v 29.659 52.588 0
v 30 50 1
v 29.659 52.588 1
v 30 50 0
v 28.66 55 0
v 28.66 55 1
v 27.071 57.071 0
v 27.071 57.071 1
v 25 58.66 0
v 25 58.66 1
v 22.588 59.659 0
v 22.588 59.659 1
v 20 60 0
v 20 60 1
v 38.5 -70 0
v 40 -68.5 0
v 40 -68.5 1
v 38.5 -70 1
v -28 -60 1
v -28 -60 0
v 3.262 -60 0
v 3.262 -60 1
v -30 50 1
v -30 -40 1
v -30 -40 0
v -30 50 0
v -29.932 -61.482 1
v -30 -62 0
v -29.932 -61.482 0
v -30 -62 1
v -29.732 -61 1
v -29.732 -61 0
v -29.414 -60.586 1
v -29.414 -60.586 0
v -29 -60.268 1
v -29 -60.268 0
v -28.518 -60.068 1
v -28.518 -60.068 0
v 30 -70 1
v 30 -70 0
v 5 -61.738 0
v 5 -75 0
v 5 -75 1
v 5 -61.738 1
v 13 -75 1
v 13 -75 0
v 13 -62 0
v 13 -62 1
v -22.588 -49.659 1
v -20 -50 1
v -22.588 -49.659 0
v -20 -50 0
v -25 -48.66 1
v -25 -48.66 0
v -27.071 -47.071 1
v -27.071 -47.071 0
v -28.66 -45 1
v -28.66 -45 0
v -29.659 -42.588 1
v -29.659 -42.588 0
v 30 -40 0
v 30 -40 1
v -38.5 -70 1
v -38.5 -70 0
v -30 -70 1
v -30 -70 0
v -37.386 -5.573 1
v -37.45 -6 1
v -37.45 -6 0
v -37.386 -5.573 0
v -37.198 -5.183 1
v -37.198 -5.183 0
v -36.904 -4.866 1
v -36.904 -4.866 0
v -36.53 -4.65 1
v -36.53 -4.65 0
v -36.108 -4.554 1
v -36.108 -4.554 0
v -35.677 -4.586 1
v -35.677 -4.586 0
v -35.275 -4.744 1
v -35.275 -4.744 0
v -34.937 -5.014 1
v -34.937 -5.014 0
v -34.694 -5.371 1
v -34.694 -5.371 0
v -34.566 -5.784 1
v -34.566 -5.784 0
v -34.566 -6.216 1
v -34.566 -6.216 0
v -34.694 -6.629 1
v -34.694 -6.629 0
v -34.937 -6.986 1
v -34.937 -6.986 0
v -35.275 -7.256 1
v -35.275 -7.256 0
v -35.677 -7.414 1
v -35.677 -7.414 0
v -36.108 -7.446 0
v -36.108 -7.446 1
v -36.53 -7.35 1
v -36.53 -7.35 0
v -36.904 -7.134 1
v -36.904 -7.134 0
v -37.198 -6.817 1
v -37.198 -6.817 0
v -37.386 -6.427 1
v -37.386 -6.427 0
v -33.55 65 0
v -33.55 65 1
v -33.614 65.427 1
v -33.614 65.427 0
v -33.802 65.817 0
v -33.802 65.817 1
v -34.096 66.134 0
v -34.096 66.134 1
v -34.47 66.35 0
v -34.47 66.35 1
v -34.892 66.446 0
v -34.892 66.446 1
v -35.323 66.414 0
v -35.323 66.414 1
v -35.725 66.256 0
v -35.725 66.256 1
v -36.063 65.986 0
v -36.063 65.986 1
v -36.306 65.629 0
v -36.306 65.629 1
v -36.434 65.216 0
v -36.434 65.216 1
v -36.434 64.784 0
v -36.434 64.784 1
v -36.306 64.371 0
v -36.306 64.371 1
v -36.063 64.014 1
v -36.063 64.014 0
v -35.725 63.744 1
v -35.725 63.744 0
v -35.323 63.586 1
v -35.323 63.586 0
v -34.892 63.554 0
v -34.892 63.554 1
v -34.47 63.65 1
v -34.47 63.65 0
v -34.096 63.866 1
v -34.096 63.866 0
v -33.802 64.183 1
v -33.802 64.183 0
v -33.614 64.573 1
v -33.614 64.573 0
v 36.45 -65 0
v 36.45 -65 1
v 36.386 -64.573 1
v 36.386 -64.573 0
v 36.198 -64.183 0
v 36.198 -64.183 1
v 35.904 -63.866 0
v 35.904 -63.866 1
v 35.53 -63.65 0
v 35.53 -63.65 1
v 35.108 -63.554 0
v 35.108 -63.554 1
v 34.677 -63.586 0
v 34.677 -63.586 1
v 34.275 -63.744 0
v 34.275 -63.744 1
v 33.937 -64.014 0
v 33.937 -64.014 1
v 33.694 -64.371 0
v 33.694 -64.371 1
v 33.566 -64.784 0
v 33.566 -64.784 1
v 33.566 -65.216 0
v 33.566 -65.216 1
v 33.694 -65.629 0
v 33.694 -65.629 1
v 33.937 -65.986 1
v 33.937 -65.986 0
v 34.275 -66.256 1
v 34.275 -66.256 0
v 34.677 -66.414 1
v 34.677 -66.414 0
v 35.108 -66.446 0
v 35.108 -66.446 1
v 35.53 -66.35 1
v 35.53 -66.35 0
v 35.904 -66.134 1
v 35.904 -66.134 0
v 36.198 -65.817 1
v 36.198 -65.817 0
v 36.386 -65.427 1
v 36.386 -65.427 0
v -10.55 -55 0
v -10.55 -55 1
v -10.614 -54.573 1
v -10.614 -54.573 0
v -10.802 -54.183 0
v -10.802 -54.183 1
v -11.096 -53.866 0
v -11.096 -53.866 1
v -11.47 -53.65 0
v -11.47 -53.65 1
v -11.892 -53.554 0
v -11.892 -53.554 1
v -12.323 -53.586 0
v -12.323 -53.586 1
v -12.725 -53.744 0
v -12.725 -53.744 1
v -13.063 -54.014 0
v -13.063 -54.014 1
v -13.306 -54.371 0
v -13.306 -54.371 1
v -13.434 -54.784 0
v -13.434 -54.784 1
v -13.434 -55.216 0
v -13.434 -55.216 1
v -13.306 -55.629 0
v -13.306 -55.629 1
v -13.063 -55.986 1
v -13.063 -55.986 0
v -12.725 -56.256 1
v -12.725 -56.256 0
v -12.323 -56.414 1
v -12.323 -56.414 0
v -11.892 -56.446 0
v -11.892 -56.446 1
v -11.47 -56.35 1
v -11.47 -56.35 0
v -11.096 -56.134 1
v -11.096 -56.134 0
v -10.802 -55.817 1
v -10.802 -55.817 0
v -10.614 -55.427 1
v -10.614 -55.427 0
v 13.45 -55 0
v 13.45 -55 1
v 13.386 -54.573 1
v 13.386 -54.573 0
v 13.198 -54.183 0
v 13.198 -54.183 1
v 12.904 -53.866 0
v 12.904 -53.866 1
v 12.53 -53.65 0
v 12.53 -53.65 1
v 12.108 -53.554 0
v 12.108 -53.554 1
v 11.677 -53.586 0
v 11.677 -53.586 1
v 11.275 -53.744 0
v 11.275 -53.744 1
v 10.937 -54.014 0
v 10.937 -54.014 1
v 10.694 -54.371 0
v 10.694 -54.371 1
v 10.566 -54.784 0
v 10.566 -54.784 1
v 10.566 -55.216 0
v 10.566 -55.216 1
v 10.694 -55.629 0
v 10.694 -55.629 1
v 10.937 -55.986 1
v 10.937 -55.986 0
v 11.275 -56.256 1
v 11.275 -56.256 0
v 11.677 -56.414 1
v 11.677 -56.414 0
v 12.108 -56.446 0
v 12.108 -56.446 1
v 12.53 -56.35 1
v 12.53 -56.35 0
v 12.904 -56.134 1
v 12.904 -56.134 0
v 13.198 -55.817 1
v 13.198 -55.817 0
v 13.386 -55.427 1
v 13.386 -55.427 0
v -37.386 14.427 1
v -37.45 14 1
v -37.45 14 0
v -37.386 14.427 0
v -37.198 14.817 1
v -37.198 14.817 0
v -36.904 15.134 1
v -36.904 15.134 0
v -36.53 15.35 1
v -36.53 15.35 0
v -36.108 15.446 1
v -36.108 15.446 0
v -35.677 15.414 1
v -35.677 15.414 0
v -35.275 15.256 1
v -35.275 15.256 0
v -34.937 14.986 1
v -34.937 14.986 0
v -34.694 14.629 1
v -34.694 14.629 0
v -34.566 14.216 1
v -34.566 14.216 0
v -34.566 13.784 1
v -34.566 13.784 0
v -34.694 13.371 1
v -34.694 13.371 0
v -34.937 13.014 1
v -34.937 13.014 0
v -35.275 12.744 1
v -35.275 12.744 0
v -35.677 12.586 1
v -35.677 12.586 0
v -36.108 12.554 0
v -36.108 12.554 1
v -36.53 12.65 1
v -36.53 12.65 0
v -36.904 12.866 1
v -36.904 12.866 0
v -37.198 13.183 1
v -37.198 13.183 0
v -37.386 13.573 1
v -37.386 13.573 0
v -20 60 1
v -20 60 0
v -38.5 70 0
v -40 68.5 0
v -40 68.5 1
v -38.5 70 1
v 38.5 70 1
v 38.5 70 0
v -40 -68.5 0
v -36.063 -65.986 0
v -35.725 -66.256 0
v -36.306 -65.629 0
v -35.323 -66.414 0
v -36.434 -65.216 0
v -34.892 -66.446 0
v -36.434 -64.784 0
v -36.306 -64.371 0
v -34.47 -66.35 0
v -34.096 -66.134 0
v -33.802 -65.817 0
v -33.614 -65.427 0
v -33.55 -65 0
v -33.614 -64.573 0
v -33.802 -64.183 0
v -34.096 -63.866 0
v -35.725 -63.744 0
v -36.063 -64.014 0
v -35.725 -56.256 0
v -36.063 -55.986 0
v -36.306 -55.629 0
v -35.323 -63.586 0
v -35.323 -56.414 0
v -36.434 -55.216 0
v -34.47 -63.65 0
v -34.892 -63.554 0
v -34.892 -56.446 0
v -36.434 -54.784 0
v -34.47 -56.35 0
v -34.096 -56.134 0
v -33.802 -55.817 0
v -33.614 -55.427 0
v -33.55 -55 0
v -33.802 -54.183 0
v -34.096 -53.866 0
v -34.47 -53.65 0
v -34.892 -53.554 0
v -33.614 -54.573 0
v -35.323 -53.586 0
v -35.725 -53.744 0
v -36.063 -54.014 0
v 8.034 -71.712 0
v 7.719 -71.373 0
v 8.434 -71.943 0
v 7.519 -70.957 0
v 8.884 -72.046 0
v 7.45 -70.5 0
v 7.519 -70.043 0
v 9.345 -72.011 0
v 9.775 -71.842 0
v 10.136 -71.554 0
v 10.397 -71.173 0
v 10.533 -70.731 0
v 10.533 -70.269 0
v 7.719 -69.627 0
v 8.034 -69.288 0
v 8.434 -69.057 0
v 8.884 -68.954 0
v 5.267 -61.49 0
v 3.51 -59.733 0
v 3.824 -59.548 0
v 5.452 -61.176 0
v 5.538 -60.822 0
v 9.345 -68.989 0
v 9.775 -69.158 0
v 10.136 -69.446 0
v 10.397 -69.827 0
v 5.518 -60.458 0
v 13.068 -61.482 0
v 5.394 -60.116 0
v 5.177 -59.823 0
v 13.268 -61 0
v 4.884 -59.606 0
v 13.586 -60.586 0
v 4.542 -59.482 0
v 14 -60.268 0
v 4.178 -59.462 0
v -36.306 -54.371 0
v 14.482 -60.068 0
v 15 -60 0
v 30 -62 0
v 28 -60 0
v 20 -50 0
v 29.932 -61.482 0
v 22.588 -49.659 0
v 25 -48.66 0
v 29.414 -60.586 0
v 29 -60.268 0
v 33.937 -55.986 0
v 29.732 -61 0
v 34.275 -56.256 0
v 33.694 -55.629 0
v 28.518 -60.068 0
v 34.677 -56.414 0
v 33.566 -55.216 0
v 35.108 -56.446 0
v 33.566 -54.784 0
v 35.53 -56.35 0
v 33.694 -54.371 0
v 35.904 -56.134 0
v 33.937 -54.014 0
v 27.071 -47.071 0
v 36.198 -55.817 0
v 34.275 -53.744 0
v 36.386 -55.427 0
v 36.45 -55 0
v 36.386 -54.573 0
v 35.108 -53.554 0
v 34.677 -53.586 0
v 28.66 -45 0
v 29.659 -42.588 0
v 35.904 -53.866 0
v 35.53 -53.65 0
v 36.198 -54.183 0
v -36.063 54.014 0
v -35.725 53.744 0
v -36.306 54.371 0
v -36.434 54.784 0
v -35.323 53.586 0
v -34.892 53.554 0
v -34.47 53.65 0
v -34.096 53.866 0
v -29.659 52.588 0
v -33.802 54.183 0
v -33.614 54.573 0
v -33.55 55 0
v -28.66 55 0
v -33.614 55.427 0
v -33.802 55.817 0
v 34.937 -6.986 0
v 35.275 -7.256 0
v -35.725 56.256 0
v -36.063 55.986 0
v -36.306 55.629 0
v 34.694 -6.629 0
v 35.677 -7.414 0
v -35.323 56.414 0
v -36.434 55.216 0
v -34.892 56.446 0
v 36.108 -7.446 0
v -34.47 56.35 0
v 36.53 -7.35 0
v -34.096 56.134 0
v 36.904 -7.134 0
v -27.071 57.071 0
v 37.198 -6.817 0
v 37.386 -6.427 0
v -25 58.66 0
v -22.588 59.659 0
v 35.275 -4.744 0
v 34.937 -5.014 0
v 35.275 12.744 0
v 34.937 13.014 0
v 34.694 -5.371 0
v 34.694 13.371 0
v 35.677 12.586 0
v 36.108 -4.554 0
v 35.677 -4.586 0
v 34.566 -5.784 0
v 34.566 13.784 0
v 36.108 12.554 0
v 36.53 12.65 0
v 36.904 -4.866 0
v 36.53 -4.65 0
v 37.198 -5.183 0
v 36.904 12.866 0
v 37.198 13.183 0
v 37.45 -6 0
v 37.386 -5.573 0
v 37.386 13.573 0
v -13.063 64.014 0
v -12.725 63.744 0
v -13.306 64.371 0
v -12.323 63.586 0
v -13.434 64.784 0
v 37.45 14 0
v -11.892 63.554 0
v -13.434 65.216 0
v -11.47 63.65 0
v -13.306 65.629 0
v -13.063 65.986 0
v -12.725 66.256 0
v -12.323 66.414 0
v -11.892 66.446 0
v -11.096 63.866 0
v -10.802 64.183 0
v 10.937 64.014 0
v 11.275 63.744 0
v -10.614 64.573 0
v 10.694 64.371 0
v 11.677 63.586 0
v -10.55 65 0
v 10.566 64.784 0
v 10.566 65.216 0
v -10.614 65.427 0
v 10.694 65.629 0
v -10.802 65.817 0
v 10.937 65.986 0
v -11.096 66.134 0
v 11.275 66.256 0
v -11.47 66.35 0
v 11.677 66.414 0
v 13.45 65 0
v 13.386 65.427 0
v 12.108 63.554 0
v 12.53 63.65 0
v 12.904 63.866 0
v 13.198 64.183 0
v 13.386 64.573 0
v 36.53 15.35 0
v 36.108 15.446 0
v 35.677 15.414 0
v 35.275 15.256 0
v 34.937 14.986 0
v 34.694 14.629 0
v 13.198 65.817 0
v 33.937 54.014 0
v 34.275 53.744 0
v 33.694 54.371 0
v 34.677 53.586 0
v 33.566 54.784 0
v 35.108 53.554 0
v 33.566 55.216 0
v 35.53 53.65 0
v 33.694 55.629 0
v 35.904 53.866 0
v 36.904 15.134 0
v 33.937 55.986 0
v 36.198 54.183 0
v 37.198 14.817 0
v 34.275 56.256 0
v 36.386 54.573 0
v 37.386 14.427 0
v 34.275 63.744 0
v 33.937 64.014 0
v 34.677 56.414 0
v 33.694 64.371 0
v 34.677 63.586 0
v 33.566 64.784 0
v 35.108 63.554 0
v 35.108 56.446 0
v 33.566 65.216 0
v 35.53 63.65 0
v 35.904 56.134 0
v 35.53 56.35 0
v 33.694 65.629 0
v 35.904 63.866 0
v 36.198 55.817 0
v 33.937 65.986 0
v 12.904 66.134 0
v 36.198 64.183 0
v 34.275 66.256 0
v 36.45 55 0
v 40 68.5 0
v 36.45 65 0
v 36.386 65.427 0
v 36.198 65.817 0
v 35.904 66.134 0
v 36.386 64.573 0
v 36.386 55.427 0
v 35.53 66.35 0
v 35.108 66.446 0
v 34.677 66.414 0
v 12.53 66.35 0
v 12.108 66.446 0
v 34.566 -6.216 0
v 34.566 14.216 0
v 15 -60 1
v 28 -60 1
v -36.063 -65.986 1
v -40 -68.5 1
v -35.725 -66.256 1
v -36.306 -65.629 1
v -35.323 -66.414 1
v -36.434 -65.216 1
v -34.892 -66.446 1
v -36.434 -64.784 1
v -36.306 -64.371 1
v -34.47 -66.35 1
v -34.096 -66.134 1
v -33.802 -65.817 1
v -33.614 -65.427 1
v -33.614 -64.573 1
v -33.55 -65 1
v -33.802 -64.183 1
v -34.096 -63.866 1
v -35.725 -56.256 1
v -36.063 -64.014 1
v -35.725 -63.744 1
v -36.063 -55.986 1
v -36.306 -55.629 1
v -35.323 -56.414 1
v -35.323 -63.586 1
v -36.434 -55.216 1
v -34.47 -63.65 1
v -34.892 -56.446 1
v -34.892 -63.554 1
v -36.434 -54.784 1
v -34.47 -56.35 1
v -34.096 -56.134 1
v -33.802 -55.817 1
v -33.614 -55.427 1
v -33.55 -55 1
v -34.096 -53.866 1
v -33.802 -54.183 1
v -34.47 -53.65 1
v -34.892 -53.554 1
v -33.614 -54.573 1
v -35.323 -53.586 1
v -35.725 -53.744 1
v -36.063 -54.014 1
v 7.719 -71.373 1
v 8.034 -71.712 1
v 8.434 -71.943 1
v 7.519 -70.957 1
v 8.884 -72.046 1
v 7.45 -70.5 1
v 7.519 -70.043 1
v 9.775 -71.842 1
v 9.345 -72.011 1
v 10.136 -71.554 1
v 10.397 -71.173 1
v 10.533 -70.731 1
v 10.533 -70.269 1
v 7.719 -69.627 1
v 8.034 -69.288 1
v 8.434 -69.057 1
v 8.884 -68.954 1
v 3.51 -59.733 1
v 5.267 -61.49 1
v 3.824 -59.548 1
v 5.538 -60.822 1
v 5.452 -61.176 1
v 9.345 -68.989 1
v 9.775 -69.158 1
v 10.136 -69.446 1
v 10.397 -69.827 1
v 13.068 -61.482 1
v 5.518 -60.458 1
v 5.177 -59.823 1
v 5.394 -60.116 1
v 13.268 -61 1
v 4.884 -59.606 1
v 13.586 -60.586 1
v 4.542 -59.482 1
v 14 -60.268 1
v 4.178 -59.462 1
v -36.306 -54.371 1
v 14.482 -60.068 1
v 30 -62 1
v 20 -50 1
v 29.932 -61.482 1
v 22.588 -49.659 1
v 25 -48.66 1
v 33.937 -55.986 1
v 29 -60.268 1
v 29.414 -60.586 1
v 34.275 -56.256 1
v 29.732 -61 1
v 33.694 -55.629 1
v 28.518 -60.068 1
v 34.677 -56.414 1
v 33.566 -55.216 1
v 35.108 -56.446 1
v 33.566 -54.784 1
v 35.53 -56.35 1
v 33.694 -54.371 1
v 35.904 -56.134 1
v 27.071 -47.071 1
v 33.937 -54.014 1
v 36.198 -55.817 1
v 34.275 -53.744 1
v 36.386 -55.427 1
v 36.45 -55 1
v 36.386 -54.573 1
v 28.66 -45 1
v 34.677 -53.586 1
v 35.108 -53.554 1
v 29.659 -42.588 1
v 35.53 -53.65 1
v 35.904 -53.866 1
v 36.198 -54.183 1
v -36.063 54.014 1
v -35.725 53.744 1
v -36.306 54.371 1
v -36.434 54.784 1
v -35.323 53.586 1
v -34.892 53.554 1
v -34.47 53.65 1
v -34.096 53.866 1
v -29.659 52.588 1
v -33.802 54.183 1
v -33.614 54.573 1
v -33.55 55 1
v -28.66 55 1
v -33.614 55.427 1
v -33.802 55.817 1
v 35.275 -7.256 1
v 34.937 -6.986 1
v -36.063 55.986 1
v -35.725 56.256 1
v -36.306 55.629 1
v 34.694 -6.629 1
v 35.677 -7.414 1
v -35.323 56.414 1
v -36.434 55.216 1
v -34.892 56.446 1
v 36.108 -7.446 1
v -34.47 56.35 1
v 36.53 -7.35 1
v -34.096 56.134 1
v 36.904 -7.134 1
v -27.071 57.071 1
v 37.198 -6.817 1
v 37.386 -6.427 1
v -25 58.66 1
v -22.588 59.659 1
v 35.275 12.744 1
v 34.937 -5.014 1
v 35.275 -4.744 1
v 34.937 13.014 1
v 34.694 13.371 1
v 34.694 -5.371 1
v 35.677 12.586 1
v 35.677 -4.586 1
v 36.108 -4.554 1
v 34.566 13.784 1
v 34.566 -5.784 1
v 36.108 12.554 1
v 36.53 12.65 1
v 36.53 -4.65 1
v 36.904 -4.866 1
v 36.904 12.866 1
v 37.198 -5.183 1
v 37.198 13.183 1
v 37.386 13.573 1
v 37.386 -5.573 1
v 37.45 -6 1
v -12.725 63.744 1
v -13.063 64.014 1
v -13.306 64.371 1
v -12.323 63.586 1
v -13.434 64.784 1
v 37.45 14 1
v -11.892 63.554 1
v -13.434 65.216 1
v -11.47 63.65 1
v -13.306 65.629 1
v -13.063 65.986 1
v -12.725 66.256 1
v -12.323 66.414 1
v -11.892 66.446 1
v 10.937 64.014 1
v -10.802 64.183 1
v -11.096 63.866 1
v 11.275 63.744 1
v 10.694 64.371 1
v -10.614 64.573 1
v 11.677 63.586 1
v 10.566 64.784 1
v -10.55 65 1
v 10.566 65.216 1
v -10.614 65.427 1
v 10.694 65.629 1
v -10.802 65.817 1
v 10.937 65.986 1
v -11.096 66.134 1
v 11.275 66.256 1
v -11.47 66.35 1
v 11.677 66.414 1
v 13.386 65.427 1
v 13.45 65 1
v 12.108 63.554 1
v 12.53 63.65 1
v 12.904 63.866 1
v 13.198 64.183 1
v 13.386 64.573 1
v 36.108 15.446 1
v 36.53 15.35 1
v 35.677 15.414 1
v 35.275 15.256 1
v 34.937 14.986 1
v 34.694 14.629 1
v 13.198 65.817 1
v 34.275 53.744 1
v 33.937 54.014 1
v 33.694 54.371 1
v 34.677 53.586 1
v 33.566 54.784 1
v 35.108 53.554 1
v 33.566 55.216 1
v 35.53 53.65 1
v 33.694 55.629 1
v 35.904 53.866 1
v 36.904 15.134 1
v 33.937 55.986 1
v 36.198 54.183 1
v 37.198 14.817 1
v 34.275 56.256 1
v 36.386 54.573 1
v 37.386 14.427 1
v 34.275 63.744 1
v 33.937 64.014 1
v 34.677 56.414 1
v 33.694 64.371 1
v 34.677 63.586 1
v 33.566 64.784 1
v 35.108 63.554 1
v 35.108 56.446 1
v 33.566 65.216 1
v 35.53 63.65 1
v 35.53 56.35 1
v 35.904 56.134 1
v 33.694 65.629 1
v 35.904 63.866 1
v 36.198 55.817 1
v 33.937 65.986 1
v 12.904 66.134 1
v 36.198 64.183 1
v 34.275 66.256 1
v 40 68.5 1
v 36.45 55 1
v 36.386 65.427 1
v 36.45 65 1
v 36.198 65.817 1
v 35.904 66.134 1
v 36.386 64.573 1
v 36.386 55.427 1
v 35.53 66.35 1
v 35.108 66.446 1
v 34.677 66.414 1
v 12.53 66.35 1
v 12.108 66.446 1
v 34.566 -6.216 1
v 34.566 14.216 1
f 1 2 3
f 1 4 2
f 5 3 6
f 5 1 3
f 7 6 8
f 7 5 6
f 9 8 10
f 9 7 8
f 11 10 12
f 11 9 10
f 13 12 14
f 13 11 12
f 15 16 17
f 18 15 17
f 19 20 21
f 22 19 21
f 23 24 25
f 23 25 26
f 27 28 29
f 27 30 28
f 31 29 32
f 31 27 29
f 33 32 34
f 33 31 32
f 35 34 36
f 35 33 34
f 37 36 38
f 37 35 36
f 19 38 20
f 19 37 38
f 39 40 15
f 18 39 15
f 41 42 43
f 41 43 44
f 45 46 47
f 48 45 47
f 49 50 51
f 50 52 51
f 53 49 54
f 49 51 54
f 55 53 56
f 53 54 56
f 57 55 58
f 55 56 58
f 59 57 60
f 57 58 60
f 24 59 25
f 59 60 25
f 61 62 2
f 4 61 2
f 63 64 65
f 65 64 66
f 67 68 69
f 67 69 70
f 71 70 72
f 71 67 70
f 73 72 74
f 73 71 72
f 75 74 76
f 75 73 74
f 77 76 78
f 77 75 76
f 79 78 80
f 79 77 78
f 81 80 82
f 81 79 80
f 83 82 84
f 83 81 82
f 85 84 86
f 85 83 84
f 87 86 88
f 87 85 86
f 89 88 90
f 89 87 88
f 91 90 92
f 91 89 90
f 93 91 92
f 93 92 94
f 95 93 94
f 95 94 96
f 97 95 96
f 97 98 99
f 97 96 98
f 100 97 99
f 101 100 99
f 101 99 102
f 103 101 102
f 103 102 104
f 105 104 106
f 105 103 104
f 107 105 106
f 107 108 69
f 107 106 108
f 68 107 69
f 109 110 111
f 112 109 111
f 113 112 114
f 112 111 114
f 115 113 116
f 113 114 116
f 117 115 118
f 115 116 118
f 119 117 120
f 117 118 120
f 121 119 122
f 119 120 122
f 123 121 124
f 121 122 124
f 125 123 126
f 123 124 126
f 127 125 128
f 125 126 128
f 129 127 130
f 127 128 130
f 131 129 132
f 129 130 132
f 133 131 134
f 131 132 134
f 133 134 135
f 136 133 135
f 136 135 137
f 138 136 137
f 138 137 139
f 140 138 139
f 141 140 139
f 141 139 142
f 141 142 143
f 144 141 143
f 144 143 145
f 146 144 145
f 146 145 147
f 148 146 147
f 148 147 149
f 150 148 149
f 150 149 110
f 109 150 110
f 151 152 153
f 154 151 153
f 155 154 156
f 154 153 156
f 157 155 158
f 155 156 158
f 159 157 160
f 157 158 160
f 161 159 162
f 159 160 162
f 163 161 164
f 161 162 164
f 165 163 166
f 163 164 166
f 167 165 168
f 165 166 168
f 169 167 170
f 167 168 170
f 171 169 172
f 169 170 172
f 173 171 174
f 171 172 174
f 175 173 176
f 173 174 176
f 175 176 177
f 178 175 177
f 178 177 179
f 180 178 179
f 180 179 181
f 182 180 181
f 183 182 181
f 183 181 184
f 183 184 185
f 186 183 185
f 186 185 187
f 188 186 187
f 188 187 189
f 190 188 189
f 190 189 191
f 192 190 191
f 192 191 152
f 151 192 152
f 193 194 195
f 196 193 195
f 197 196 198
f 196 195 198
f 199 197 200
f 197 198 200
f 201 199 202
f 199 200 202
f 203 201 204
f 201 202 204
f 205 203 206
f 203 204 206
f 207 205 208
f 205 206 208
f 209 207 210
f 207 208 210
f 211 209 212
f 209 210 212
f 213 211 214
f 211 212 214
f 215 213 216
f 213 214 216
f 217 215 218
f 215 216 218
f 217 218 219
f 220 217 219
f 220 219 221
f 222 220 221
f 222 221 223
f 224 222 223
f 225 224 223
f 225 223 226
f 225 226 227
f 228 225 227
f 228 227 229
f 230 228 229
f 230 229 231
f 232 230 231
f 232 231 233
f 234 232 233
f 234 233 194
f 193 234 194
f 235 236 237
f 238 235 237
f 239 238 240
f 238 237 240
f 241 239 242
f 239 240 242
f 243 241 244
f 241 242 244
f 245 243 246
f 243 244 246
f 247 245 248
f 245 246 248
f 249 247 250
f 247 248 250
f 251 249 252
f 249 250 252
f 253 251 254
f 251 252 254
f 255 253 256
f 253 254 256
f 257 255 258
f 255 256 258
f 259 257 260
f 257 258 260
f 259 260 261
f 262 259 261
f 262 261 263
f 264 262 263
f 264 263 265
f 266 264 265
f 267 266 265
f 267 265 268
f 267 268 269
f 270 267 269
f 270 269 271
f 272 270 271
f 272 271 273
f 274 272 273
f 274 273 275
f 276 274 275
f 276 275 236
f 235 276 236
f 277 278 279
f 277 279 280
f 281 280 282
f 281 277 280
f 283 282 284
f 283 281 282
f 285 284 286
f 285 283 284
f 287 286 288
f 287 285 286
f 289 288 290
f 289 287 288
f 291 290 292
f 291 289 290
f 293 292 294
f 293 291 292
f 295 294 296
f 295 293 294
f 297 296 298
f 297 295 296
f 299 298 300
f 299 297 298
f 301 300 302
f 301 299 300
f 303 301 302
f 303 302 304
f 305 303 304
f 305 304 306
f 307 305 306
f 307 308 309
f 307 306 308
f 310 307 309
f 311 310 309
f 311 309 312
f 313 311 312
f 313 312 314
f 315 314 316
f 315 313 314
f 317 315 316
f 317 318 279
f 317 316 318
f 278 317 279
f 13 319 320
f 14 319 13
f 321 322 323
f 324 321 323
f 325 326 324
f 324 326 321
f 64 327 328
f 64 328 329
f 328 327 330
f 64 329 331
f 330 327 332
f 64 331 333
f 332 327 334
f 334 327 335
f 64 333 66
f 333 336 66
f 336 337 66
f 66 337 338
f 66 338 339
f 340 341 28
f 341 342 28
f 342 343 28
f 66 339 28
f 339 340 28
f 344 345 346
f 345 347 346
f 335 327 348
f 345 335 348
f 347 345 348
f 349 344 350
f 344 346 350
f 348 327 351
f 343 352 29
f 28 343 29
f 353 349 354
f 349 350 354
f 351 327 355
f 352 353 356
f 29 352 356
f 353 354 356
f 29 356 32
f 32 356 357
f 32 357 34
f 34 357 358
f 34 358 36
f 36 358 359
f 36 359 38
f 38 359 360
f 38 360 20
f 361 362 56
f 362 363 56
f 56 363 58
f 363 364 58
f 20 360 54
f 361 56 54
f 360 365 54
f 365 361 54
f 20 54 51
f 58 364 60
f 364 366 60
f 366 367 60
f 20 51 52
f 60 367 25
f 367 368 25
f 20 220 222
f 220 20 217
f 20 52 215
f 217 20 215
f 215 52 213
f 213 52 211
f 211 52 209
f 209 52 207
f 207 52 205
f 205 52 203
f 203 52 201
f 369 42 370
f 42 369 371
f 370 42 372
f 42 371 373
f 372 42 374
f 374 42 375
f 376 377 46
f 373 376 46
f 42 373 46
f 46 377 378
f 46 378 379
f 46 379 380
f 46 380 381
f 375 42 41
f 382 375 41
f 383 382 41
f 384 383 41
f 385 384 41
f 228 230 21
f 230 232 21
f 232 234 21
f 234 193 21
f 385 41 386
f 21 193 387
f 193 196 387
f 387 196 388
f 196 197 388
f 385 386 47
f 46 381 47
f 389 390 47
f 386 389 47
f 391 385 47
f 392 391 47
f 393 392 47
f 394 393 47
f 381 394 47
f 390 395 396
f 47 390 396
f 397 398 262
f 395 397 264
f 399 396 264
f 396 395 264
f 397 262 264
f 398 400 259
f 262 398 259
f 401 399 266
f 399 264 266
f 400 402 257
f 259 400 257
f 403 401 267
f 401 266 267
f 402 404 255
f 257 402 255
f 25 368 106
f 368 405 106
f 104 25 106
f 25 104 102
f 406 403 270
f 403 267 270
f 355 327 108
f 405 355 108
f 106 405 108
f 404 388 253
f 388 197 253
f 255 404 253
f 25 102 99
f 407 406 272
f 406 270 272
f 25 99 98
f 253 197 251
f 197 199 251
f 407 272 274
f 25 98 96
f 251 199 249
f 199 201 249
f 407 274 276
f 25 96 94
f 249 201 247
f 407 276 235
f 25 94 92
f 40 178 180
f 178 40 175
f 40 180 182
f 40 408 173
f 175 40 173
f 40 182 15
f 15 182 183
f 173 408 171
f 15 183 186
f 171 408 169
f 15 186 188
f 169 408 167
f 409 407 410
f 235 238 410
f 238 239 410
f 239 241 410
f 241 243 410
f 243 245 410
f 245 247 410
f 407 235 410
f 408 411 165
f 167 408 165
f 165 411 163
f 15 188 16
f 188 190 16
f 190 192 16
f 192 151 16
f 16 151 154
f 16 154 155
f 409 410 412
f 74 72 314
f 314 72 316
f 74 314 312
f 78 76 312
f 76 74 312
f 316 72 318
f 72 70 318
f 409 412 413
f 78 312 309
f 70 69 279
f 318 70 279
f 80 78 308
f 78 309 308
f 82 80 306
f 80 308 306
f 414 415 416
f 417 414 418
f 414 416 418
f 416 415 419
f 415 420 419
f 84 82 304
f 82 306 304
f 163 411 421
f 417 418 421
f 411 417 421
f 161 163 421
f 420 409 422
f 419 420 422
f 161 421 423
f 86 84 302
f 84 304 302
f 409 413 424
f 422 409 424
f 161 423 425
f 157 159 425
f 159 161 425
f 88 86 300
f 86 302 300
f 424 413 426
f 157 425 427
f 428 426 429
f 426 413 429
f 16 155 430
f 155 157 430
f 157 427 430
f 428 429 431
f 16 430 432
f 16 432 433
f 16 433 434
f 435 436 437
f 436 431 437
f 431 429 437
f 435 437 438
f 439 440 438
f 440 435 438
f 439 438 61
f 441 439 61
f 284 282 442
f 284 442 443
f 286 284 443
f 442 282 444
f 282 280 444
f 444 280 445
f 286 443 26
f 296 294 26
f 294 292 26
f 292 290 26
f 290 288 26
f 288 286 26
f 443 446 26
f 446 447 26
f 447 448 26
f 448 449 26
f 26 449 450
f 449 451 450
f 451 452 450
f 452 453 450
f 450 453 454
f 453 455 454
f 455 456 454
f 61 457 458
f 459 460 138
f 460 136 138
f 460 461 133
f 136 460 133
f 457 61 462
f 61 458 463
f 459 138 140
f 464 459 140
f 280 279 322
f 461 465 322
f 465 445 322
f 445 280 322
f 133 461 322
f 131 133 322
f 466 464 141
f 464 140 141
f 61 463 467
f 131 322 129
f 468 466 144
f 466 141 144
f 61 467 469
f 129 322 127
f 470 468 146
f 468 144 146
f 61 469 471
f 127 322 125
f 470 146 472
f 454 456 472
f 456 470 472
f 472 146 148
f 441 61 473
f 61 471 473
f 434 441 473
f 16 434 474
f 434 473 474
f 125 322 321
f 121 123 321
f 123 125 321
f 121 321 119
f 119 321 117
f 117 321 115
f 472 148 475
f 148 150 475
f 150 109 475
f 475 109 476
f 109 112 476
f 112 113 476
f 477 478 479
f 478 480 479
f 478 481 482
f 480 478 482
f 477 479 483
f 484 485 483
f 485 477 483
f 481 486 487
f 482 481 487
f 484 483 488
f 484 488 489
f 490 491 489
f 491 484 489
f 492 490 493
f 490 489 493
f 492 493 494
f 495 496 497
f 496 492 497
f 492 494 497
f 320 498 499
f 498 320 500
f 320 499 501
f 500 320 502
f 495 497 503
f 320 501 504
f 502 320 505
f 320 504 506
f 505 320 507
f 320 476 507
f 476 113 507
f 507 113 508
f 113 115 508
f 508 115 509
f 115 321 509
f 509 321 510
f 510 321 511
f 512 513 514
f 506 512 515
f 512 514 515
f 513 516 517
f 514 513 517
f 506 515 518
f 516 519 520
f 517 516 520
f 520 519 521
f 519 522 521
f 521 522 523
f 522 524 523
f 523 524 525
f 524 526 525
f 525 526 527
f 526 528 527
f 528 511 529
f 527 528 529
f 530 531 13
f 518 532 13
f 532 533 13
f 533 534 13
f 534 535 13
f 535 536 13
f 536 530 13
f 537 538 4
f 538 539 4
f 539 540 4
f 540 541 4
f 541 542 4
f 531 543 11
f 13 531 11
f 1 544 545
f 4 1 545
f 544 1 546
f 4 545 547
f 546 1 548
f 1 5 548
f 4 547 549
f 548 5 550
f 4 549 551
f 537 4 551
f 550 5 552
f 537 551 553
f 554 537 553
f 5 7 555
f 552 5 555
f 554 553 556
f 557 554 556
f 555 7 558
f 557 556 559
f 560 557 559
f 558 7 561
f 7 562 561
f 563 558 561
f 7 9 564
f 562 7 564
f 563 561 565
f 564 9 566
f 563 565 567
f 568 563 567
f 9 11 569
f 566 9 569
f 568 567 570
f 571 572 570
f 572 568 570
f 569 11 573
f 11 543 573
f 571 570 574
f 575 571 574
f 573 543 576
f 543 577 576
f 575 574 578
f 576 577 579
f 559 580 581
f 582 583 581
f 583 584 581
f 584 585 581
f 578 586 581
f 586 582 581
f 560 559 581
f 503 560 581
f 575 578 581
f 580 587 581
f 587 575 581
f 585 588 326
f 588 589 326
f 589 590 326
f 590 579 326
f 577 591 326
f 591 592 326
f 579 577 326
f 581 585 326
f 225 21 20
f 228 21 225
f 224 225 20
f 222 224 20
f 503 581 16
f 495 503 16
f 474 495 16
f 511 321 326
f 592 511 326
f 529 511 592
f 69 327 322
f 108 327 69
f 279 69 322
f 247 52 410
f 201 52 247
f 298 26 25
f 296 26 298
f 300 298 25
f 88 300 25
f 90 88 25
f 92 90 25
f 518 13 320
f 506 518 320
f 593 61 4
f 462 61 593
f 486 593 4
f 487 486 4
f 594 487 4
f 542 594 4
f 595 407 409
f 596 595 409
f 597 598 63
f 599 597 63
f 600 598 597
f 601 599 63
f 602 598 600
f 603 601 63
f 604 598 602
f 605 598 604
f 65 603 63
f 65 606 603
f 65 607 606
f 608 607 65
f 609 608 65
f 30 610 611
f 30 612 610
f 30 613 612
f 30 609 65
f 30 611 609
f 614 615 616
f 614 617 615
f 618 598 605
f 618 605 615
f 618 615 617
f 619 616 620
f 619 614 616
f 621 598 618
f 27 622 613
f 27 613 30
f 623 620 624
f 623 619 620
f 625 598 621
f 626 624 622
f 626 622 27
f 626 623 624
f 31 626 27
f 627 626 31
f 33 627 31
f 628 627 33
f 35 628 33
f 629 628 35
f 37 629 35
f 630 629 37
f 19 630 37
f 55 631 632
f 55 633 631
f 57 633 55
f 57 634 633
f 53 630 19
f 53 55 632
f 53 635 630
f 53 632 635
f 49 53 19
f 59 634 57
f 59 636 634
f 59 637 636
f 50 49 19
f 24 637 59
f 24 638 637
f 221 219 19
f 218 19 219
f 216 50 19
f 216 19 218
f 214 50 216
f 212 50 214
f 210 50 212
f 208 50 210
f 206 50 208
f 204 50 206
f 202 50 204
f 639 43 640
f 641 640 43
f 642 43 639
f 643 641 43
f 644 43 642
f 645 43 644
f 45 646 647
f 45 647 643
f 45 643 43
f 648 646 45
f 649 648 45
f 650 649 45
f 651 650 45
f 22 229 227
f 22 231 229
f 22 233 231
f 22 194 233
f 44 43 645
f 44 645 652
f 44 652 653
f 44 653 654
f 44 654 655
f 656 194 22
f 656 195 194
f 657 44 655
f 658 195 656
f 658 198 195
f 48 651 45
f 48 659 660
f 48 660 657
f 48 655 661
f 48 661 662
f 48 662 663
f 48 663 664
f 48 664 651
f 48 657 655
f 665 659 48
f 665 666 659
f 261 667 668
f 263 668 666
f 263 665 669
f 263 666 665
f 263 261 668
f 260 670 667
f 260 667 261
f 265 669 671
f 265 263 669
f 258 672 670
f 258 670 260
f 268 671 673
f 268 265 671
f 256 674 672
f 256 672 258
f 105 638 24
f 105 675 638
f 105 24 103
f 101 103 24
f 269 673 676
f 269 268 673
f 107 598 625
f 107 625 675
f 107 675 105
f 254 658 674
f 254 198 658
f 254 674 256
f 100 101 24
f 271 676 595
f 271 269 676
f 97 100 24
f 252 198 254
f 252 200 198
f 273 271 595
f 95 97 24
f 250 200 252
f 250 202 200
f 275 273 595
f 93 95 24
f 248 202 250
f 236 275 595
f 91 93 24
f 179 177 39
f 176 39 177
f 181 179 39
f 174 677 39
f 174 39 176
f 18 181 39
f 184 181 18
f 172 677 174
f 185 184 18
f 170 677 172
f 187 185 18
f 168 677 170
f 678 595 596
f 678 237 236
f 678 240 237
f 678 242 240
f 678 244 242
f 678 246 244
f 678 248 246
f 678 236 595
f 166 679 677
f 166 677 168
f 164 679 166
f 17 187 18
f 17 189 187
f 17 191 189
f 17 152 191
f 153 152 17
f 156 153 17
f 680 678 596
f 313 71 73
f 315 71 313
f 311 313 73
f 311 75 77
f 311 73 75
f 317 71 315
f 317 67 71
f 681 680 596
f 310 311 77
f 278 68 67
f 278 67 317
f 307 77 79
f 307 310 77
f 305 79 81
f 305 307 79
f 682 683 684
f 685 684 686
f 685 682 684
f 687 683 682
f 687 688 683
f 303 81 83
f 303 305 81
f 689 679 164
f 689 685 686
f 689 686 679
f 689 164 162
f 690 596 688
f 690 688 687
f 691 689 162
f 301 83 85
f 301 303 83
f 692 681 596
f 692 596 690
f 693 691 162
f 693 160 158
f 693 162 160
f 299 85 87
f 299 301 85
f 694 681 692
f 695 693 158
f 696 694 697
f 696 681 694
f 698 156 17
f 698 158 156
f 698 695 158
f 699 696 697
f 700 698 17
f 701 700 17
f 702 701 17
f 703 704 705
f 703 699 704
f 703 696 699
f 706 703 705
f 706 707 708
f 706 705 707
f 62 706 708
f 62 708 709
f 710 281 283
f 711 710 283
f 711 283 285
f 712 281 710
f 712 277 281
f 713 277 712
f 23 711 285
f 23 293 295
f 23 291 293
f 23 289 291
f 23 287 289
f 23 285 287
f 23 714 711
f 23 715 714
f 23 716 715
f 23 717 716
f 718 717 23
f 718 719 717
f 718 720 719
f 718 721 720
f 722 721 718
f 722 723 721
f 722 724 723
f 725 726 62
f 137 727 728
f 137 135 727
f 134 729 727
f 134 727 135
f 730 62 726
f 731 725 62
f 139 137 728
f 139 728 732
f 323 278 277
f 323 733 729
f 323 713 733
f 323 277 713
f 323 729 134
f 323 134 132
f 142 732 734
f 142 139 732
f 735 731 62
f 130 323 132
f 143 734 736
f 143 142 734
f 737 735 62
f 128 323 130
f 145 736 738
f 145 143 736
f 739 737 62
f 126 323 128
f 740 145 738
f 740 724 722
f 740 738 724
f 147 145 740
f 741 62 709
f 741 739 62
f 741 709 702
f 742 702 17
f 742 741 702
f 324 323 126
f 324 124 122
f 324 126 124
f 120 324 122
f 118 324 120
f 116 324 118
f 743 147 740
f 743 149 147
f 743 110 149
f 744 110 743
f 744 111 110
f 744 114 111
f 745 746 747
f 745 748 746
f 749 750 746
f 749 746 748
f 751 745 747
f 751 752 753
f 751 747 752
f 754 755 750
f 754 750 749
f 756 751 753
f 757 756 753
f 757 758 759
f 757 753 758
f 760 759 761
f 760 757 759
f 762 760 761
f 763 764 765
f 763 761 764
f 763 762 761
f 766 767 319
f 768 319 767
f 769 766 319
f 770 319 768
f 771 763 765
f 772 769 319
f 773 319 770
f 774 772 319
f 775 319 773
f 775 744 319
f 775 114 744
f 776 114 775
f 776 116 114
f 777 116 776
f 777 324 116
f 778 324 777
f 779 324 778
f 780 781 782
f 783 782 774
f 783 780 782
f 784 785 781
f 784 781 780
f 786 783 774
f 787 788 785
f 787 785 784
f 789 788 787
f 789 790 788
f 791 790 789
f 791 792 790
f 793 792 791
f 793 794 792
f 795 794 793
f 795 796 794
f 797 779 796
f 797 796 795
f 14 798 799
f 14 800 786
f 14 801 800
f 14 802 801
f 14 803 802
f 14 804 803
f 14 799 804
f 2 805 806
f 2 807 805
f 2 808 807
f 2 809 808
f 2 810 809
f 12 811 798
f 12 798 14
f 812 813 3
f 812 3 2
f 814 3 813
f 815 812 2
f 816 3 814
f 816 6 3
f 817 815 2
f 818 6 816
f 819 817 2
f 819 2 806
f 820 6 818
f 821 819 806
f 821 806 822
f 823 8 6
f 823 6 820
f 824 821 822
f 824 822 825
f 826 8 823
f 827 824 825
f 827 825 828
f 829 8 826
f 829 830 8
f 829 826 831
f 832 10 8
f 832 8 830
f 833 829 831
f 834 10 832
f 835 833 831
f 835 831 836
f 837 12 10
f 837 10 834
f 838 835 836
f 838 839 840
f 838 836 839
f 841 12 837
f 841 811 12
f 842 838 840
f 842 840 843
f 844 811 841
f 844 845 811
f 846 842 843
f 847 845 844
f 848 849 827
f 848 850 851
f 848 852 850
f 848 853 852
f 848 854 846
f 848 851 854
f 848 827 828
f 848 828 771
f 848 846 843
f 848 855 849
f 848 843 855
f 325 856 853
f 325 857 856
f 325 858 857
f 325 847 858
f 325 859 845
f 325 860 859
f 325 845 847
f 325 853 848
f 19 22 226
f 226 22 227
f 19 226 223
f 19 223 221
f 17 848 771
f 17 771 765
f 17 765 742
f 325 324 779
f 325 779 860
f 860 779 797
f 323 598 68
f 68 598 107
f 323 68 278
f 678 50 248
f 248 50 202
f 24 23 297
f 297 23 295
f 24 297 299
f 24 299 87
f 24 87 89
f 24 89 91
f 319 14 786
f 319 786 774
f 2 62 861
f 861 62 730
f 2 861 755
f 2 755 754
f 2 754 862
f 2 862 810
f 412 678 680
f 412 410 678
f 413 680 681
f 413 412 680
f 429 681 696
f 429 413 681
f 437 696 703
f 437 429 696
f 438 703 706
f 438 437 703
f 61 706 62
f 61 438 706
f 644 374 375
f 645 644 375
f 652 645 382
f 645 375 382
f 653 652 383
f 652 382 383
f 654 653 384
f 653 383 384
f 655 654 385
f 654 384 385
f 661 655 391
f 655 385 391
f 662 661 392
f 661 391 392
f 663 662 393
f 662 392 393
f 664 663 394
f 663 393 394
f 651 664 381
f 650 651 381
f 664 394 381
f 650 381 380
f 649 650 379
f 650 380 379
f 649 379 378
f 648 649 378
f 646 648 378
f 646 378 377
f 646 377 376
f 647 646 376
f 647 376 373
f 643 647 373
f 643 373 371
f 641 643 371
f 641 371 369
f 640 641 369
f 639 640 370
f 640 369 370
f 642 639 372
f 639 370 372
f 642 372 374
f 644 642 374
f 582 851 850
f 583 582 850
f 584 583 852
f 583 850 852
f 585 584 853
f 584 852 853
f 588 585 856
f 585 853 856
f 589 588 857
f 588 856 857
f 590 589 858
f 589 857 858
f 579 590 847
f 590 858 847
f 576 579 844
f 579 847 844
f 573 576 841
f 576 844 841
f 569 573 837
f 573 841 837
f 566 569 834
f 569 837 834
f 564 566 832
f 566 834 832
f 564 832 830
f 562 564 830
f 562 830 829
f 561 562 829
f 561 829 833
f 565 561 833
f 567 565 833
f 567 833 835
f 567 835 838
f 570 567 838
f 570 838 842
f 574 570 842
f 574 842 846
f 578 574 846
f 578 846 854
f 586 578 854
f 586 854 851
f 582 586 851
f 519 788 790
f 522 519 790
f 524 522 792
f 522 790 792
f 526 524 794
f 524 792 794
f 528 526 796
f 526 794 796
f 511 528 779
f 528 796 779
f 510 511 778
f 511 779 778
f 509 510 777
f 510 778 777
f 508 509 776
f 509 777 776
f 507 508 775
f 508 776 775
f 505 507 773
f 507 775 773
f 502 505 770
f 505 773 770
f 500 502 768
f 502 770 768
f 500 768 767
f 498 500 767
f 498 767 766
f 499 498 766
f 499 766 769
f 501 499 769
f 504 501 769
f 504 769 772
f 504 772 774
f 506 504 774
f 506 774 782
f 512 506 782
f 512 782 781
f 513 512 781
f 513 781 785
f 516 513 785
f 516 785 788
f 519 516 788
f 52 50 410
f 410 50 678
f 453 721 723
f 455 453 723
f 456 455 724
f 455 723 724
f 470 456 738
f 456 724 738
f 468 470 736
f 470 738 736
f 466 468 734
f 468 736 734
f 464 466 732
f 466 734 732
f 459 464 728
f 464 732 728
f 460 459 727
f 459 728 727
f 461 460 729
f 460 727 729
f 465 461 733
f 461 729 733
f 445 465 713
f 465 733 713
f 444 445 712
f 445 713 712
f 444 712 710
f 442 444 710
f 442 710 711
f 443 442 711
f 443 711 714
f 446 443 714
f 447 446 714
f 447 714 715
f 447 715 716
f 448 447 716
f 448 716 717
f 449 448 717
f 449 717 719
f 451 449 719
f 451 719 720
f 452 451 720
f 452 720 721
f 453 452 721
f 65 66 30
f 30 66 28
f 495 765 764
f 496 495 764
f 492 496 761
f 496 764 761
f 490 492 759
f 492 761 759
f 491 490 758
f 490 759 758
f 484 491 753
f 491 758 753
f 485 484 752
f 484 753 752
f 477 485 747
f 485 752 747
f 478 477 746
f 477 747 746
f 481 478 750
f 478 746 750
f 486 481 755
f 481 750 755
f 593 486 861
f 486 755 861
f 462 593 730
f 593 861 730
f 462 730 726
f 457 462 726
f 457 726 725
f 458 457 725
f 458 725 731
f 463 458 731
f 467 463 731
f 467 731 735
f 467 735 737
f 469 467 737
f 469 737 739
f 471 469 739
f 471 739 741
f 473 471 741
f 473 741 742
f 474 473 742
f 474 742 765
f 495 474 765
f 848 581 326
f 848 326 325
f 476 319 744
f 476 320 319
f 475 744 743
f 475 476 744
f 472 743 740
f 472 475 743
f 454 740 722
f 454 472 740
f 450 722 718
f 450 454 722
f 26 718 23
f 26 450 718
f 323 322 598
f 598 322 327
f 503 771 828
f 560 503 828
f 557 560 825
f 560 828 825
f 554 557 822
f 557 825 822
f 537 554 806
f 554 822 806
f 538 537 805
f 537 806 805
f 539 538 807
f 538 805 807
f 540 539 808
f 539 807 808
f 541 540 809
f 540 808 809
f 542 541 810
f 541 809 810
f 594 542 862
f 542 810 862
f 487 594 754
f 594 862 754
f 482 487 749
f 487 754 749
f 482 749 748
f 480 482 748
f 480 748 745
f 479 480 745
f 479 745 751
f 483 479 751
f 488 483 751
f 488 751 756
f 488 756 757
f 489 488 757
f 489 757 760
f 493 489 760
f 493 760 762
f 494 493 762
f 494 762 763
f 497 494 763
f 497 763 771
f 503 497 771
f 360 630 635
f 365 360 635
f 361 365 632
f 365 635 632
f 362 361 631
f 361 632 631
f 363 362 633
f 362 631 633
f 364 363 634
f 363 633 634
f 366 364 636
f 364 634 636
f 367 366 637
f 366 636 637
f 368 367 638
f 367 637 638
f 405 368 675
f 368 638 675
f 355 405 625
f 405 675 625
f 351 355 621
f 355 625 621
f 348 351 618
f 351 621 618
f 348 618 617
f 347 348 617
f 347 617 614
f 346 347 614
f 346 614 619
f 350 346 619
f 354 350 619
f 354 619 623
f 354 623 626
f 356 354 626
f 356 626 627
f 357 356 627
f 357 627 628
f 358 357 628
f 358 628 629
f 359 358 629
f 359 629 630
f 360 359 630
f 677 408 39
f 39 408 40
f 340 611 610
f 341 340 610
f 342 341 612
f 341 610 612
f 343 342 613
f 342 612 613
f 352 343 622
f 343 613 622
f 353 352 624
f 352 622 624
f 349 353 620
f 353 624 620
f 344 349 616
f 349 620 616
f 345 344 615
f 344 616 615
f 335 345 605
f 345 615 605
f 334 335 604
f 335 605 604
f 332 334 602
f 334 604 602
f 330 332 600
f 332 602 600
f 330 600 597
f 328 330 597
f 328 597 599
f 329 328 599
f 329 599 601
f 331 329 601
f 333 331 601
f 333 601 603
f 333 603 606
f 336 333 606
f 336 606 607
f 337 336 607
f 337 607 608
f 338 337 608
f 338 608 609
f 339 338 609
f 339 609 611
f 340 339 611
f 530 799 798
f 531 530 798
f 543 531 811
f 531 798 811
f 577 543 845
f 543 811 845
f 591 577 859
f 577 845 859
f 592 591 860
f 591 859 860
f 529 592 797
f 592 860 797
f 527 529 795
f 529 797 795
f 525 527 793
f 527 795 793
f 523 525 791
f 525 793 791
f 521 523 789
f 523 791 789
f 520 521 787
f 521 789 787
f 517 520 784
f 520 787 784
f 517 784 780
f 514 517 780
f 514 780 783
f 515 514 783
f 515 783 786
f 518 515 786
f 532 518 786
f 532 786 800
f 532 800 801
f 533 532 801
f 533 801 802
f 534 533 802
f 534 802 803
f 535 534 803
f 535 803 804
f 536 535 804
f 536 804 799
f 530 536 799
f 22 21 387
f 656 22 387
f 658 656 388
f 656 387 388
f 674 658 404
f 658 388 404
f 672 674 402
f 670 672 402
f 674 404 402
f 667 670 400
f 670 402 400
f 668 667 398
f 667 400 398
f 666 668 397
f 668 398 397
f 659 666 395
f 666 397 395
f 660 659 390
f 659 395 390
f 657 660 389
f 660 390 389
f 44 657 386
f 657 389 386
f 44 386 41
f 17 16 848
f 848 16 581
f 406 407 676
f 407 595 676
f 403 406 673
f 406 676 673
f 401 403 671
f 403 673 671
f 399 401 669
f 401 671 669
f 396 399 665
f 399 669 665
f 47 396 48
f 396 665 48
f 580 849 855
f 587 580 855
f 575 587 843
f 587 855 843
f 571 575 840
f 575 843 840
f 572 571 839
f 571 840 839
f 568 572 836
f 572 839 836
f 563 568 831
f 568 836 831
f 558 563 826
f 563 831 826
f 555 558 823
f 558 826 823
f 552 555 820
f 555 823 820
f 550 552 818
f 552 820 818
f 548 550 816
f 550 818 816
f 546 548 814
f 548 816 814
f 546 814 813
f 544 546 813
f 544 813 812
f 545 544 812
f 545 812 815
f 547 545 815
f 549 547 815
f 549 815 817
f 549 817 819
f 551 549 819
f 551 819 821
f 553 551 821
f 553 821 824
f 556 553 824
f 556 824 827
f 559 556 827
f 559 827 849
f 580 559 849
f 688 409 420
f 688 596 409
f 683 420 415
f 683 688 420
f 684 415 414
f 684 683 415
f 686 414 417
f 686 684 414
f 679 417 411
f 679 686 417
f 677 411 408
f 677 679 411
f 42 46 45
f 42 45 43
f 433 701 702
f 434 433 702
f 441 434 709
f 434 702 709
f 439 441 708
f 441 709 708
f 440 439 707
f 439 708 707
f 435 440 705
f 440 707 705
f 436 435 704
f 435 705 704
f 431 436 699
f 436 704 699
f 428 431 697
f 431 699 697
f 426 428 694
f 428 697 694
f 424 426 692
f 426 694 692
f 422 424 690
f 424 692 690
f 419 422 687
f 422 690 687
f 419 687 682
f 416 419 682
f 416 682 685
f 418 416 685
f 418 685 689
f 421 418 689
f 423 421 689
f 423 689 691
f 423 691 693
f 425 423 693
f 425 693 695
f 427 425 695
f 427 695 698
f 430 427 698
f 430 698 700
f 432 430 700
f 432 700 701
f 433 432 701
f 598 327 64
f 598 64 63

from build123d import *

# Parameters (mm, degrees)
BOSS_EXTRUDE12_DEPTH       = 1
SKETCH88_W                 = 60
SKETCH88_H                 = 110
CUT_EXTRUDE1_DEPTH         = 1
FILLET1_R                  = 10
M2_5_CLEARANCE_HOLE1_D     = 2.9
M2_5_CLEARANCE_HOLE1_DEPTH = 11.5
SKETCH91_W                 = 8
SKETCH91_H                 = 15
SKETCH91_R                 = 1.55
BOSS_EXTRUDE13_DEPTH       = 1
FILLET2_R                  = 2
CHAMFER1_SIZE              = 1.5
SKETCH93_R                 = 1.25
CUT_EXTRUDE2_DEPTH         = 10
M2_5_CLEARANCE_HOLE2_D     = 2.9
M2_5_CLEARANCE_HOLE2_DEPTH = 30


with BuildPart() as part:
    # Sketch87 → Boss-Extrude12 (new body)
    with BuildSketch(Plane.XY):
        Polygon((-40, 70), (-40, -70), (-30, -70), (-30, -60), (30, -60), (30, -70), (40, -70), (40, 70), align=None)
    extrude(amount=BOSS_EXTRUDE12_DEPTH)

    # Sketch88 → Cut-Extrude1 (cut)
    with BuildSketch(Plane.XY.offset(1)):
        with Locations((0, 5)):
            Rectangle(SKETCH88_W, SKETCH88_H)
    extrude(amount=-CUT_EXTRUDE1_DEPTH, mode=Mode.SUBTRACT)

    # Fillet1
    fillet1_edges = [part.edges().sort_by_distance(p)[0] for p in [
        (-30, -50, 0.5),
        (-30, 60, 0.5),
        (30, 60, 0.5),
        (30, -50, 0.5),
    ]]
    fillet(fillet1_edges, radius=FILLET1_R)

    # M2.5 Clearance Hole1
    with Locations(Plane(origin=(0, 0, 0), x_dir=(-1, 0, 0), z_dir=(0, 0, -1))):
        with Locations((35, -65), (35, -55), (-35, -55), (-35, -65), (12, -55), (-12, -55), (-12, 65), (12, 65), (-35, 65), (35, 65), (-35, 55), (35, 55)):
            Hole(M2_5_CLEARANCE_HOLE1_D / 2, depth=M2_5_CLEARANCE_HOLE1_DEPTH)

    # Sketch91 → Boss-Extrude13 (add)
    with BuildSketch(Plane(origin=(0, 0, 0), x_dir=(-1, 0, 0), z_dir=(0, 0, -1))):
        with Locations((-9, -67.5)):
            Rectangle(SKETCH91_W, SKETCH91_H)
        with Locations((-9, -70.5)):
            Circle(SKETCH91_R, mode=Mode.SUBTRACT)
    extrude(amount=-BOSS_EXTRUDE13_DEPTH)

    # Fillet2
    fillet2_edges = [part.edges().sort_by_distance(p)[0] for p in [
        (30, -60, 0.5),
        (-30, -60, 0.5),
        (13, -60, 0.5),
    ]]
    fillet(fillet2_edges, radius=FILLET2_R)

    # Chamfer1
    chamfer1_edges = [part.edges().sort_by_distance(p)[0] for p in [
        (40, 70, 0.5),
        (40, -70, 0.5),
        (-40, -70, 0.5),
        (-40, 70, 0.5),
    ]]
    chamfer(chamfer1_edges, length=CHAMFER1_SIZE)

    # Sketch93 → Cut-Extrude2 (cut)
    with BuildSketch(Plane(origin=(0, 0, 0), x_dir=(-1, 0, 0), z_dir=(0, 0, -1))):
        with Locations((-4.292893219, -60.707106781)):
            Circle(SKETCH93_R)
    extrude(amount=-CUT_EXTRUDE2_DEPTH, mode=Mode.SUBTRACT)

    # M2.5 Clearance Hole2
    with Locations(Plane(origin=(0, 0, 0), x_dir=(-1, 0, 0), z_dir=(0, 0, -1))):
        with Locations((-36, 14), (-36, -6)):
            m2_5_clearance_hole2 = Hole(M2_5_CLEARANCE_HOLE2_D / 2, depth=M2_5_CLEARANCE_HOLE2_DEPTH)

    # Mirror1: M2.5 Clearance Hole2 across plane
    add(m2_5_clearance_hole2.mirror(Plane(origin=(0, 0, 0), x_dir=(0, 0, 1), z_dir=(1, 0, 0))), mode=Mode.SUBTRACT)


solid = part.part
